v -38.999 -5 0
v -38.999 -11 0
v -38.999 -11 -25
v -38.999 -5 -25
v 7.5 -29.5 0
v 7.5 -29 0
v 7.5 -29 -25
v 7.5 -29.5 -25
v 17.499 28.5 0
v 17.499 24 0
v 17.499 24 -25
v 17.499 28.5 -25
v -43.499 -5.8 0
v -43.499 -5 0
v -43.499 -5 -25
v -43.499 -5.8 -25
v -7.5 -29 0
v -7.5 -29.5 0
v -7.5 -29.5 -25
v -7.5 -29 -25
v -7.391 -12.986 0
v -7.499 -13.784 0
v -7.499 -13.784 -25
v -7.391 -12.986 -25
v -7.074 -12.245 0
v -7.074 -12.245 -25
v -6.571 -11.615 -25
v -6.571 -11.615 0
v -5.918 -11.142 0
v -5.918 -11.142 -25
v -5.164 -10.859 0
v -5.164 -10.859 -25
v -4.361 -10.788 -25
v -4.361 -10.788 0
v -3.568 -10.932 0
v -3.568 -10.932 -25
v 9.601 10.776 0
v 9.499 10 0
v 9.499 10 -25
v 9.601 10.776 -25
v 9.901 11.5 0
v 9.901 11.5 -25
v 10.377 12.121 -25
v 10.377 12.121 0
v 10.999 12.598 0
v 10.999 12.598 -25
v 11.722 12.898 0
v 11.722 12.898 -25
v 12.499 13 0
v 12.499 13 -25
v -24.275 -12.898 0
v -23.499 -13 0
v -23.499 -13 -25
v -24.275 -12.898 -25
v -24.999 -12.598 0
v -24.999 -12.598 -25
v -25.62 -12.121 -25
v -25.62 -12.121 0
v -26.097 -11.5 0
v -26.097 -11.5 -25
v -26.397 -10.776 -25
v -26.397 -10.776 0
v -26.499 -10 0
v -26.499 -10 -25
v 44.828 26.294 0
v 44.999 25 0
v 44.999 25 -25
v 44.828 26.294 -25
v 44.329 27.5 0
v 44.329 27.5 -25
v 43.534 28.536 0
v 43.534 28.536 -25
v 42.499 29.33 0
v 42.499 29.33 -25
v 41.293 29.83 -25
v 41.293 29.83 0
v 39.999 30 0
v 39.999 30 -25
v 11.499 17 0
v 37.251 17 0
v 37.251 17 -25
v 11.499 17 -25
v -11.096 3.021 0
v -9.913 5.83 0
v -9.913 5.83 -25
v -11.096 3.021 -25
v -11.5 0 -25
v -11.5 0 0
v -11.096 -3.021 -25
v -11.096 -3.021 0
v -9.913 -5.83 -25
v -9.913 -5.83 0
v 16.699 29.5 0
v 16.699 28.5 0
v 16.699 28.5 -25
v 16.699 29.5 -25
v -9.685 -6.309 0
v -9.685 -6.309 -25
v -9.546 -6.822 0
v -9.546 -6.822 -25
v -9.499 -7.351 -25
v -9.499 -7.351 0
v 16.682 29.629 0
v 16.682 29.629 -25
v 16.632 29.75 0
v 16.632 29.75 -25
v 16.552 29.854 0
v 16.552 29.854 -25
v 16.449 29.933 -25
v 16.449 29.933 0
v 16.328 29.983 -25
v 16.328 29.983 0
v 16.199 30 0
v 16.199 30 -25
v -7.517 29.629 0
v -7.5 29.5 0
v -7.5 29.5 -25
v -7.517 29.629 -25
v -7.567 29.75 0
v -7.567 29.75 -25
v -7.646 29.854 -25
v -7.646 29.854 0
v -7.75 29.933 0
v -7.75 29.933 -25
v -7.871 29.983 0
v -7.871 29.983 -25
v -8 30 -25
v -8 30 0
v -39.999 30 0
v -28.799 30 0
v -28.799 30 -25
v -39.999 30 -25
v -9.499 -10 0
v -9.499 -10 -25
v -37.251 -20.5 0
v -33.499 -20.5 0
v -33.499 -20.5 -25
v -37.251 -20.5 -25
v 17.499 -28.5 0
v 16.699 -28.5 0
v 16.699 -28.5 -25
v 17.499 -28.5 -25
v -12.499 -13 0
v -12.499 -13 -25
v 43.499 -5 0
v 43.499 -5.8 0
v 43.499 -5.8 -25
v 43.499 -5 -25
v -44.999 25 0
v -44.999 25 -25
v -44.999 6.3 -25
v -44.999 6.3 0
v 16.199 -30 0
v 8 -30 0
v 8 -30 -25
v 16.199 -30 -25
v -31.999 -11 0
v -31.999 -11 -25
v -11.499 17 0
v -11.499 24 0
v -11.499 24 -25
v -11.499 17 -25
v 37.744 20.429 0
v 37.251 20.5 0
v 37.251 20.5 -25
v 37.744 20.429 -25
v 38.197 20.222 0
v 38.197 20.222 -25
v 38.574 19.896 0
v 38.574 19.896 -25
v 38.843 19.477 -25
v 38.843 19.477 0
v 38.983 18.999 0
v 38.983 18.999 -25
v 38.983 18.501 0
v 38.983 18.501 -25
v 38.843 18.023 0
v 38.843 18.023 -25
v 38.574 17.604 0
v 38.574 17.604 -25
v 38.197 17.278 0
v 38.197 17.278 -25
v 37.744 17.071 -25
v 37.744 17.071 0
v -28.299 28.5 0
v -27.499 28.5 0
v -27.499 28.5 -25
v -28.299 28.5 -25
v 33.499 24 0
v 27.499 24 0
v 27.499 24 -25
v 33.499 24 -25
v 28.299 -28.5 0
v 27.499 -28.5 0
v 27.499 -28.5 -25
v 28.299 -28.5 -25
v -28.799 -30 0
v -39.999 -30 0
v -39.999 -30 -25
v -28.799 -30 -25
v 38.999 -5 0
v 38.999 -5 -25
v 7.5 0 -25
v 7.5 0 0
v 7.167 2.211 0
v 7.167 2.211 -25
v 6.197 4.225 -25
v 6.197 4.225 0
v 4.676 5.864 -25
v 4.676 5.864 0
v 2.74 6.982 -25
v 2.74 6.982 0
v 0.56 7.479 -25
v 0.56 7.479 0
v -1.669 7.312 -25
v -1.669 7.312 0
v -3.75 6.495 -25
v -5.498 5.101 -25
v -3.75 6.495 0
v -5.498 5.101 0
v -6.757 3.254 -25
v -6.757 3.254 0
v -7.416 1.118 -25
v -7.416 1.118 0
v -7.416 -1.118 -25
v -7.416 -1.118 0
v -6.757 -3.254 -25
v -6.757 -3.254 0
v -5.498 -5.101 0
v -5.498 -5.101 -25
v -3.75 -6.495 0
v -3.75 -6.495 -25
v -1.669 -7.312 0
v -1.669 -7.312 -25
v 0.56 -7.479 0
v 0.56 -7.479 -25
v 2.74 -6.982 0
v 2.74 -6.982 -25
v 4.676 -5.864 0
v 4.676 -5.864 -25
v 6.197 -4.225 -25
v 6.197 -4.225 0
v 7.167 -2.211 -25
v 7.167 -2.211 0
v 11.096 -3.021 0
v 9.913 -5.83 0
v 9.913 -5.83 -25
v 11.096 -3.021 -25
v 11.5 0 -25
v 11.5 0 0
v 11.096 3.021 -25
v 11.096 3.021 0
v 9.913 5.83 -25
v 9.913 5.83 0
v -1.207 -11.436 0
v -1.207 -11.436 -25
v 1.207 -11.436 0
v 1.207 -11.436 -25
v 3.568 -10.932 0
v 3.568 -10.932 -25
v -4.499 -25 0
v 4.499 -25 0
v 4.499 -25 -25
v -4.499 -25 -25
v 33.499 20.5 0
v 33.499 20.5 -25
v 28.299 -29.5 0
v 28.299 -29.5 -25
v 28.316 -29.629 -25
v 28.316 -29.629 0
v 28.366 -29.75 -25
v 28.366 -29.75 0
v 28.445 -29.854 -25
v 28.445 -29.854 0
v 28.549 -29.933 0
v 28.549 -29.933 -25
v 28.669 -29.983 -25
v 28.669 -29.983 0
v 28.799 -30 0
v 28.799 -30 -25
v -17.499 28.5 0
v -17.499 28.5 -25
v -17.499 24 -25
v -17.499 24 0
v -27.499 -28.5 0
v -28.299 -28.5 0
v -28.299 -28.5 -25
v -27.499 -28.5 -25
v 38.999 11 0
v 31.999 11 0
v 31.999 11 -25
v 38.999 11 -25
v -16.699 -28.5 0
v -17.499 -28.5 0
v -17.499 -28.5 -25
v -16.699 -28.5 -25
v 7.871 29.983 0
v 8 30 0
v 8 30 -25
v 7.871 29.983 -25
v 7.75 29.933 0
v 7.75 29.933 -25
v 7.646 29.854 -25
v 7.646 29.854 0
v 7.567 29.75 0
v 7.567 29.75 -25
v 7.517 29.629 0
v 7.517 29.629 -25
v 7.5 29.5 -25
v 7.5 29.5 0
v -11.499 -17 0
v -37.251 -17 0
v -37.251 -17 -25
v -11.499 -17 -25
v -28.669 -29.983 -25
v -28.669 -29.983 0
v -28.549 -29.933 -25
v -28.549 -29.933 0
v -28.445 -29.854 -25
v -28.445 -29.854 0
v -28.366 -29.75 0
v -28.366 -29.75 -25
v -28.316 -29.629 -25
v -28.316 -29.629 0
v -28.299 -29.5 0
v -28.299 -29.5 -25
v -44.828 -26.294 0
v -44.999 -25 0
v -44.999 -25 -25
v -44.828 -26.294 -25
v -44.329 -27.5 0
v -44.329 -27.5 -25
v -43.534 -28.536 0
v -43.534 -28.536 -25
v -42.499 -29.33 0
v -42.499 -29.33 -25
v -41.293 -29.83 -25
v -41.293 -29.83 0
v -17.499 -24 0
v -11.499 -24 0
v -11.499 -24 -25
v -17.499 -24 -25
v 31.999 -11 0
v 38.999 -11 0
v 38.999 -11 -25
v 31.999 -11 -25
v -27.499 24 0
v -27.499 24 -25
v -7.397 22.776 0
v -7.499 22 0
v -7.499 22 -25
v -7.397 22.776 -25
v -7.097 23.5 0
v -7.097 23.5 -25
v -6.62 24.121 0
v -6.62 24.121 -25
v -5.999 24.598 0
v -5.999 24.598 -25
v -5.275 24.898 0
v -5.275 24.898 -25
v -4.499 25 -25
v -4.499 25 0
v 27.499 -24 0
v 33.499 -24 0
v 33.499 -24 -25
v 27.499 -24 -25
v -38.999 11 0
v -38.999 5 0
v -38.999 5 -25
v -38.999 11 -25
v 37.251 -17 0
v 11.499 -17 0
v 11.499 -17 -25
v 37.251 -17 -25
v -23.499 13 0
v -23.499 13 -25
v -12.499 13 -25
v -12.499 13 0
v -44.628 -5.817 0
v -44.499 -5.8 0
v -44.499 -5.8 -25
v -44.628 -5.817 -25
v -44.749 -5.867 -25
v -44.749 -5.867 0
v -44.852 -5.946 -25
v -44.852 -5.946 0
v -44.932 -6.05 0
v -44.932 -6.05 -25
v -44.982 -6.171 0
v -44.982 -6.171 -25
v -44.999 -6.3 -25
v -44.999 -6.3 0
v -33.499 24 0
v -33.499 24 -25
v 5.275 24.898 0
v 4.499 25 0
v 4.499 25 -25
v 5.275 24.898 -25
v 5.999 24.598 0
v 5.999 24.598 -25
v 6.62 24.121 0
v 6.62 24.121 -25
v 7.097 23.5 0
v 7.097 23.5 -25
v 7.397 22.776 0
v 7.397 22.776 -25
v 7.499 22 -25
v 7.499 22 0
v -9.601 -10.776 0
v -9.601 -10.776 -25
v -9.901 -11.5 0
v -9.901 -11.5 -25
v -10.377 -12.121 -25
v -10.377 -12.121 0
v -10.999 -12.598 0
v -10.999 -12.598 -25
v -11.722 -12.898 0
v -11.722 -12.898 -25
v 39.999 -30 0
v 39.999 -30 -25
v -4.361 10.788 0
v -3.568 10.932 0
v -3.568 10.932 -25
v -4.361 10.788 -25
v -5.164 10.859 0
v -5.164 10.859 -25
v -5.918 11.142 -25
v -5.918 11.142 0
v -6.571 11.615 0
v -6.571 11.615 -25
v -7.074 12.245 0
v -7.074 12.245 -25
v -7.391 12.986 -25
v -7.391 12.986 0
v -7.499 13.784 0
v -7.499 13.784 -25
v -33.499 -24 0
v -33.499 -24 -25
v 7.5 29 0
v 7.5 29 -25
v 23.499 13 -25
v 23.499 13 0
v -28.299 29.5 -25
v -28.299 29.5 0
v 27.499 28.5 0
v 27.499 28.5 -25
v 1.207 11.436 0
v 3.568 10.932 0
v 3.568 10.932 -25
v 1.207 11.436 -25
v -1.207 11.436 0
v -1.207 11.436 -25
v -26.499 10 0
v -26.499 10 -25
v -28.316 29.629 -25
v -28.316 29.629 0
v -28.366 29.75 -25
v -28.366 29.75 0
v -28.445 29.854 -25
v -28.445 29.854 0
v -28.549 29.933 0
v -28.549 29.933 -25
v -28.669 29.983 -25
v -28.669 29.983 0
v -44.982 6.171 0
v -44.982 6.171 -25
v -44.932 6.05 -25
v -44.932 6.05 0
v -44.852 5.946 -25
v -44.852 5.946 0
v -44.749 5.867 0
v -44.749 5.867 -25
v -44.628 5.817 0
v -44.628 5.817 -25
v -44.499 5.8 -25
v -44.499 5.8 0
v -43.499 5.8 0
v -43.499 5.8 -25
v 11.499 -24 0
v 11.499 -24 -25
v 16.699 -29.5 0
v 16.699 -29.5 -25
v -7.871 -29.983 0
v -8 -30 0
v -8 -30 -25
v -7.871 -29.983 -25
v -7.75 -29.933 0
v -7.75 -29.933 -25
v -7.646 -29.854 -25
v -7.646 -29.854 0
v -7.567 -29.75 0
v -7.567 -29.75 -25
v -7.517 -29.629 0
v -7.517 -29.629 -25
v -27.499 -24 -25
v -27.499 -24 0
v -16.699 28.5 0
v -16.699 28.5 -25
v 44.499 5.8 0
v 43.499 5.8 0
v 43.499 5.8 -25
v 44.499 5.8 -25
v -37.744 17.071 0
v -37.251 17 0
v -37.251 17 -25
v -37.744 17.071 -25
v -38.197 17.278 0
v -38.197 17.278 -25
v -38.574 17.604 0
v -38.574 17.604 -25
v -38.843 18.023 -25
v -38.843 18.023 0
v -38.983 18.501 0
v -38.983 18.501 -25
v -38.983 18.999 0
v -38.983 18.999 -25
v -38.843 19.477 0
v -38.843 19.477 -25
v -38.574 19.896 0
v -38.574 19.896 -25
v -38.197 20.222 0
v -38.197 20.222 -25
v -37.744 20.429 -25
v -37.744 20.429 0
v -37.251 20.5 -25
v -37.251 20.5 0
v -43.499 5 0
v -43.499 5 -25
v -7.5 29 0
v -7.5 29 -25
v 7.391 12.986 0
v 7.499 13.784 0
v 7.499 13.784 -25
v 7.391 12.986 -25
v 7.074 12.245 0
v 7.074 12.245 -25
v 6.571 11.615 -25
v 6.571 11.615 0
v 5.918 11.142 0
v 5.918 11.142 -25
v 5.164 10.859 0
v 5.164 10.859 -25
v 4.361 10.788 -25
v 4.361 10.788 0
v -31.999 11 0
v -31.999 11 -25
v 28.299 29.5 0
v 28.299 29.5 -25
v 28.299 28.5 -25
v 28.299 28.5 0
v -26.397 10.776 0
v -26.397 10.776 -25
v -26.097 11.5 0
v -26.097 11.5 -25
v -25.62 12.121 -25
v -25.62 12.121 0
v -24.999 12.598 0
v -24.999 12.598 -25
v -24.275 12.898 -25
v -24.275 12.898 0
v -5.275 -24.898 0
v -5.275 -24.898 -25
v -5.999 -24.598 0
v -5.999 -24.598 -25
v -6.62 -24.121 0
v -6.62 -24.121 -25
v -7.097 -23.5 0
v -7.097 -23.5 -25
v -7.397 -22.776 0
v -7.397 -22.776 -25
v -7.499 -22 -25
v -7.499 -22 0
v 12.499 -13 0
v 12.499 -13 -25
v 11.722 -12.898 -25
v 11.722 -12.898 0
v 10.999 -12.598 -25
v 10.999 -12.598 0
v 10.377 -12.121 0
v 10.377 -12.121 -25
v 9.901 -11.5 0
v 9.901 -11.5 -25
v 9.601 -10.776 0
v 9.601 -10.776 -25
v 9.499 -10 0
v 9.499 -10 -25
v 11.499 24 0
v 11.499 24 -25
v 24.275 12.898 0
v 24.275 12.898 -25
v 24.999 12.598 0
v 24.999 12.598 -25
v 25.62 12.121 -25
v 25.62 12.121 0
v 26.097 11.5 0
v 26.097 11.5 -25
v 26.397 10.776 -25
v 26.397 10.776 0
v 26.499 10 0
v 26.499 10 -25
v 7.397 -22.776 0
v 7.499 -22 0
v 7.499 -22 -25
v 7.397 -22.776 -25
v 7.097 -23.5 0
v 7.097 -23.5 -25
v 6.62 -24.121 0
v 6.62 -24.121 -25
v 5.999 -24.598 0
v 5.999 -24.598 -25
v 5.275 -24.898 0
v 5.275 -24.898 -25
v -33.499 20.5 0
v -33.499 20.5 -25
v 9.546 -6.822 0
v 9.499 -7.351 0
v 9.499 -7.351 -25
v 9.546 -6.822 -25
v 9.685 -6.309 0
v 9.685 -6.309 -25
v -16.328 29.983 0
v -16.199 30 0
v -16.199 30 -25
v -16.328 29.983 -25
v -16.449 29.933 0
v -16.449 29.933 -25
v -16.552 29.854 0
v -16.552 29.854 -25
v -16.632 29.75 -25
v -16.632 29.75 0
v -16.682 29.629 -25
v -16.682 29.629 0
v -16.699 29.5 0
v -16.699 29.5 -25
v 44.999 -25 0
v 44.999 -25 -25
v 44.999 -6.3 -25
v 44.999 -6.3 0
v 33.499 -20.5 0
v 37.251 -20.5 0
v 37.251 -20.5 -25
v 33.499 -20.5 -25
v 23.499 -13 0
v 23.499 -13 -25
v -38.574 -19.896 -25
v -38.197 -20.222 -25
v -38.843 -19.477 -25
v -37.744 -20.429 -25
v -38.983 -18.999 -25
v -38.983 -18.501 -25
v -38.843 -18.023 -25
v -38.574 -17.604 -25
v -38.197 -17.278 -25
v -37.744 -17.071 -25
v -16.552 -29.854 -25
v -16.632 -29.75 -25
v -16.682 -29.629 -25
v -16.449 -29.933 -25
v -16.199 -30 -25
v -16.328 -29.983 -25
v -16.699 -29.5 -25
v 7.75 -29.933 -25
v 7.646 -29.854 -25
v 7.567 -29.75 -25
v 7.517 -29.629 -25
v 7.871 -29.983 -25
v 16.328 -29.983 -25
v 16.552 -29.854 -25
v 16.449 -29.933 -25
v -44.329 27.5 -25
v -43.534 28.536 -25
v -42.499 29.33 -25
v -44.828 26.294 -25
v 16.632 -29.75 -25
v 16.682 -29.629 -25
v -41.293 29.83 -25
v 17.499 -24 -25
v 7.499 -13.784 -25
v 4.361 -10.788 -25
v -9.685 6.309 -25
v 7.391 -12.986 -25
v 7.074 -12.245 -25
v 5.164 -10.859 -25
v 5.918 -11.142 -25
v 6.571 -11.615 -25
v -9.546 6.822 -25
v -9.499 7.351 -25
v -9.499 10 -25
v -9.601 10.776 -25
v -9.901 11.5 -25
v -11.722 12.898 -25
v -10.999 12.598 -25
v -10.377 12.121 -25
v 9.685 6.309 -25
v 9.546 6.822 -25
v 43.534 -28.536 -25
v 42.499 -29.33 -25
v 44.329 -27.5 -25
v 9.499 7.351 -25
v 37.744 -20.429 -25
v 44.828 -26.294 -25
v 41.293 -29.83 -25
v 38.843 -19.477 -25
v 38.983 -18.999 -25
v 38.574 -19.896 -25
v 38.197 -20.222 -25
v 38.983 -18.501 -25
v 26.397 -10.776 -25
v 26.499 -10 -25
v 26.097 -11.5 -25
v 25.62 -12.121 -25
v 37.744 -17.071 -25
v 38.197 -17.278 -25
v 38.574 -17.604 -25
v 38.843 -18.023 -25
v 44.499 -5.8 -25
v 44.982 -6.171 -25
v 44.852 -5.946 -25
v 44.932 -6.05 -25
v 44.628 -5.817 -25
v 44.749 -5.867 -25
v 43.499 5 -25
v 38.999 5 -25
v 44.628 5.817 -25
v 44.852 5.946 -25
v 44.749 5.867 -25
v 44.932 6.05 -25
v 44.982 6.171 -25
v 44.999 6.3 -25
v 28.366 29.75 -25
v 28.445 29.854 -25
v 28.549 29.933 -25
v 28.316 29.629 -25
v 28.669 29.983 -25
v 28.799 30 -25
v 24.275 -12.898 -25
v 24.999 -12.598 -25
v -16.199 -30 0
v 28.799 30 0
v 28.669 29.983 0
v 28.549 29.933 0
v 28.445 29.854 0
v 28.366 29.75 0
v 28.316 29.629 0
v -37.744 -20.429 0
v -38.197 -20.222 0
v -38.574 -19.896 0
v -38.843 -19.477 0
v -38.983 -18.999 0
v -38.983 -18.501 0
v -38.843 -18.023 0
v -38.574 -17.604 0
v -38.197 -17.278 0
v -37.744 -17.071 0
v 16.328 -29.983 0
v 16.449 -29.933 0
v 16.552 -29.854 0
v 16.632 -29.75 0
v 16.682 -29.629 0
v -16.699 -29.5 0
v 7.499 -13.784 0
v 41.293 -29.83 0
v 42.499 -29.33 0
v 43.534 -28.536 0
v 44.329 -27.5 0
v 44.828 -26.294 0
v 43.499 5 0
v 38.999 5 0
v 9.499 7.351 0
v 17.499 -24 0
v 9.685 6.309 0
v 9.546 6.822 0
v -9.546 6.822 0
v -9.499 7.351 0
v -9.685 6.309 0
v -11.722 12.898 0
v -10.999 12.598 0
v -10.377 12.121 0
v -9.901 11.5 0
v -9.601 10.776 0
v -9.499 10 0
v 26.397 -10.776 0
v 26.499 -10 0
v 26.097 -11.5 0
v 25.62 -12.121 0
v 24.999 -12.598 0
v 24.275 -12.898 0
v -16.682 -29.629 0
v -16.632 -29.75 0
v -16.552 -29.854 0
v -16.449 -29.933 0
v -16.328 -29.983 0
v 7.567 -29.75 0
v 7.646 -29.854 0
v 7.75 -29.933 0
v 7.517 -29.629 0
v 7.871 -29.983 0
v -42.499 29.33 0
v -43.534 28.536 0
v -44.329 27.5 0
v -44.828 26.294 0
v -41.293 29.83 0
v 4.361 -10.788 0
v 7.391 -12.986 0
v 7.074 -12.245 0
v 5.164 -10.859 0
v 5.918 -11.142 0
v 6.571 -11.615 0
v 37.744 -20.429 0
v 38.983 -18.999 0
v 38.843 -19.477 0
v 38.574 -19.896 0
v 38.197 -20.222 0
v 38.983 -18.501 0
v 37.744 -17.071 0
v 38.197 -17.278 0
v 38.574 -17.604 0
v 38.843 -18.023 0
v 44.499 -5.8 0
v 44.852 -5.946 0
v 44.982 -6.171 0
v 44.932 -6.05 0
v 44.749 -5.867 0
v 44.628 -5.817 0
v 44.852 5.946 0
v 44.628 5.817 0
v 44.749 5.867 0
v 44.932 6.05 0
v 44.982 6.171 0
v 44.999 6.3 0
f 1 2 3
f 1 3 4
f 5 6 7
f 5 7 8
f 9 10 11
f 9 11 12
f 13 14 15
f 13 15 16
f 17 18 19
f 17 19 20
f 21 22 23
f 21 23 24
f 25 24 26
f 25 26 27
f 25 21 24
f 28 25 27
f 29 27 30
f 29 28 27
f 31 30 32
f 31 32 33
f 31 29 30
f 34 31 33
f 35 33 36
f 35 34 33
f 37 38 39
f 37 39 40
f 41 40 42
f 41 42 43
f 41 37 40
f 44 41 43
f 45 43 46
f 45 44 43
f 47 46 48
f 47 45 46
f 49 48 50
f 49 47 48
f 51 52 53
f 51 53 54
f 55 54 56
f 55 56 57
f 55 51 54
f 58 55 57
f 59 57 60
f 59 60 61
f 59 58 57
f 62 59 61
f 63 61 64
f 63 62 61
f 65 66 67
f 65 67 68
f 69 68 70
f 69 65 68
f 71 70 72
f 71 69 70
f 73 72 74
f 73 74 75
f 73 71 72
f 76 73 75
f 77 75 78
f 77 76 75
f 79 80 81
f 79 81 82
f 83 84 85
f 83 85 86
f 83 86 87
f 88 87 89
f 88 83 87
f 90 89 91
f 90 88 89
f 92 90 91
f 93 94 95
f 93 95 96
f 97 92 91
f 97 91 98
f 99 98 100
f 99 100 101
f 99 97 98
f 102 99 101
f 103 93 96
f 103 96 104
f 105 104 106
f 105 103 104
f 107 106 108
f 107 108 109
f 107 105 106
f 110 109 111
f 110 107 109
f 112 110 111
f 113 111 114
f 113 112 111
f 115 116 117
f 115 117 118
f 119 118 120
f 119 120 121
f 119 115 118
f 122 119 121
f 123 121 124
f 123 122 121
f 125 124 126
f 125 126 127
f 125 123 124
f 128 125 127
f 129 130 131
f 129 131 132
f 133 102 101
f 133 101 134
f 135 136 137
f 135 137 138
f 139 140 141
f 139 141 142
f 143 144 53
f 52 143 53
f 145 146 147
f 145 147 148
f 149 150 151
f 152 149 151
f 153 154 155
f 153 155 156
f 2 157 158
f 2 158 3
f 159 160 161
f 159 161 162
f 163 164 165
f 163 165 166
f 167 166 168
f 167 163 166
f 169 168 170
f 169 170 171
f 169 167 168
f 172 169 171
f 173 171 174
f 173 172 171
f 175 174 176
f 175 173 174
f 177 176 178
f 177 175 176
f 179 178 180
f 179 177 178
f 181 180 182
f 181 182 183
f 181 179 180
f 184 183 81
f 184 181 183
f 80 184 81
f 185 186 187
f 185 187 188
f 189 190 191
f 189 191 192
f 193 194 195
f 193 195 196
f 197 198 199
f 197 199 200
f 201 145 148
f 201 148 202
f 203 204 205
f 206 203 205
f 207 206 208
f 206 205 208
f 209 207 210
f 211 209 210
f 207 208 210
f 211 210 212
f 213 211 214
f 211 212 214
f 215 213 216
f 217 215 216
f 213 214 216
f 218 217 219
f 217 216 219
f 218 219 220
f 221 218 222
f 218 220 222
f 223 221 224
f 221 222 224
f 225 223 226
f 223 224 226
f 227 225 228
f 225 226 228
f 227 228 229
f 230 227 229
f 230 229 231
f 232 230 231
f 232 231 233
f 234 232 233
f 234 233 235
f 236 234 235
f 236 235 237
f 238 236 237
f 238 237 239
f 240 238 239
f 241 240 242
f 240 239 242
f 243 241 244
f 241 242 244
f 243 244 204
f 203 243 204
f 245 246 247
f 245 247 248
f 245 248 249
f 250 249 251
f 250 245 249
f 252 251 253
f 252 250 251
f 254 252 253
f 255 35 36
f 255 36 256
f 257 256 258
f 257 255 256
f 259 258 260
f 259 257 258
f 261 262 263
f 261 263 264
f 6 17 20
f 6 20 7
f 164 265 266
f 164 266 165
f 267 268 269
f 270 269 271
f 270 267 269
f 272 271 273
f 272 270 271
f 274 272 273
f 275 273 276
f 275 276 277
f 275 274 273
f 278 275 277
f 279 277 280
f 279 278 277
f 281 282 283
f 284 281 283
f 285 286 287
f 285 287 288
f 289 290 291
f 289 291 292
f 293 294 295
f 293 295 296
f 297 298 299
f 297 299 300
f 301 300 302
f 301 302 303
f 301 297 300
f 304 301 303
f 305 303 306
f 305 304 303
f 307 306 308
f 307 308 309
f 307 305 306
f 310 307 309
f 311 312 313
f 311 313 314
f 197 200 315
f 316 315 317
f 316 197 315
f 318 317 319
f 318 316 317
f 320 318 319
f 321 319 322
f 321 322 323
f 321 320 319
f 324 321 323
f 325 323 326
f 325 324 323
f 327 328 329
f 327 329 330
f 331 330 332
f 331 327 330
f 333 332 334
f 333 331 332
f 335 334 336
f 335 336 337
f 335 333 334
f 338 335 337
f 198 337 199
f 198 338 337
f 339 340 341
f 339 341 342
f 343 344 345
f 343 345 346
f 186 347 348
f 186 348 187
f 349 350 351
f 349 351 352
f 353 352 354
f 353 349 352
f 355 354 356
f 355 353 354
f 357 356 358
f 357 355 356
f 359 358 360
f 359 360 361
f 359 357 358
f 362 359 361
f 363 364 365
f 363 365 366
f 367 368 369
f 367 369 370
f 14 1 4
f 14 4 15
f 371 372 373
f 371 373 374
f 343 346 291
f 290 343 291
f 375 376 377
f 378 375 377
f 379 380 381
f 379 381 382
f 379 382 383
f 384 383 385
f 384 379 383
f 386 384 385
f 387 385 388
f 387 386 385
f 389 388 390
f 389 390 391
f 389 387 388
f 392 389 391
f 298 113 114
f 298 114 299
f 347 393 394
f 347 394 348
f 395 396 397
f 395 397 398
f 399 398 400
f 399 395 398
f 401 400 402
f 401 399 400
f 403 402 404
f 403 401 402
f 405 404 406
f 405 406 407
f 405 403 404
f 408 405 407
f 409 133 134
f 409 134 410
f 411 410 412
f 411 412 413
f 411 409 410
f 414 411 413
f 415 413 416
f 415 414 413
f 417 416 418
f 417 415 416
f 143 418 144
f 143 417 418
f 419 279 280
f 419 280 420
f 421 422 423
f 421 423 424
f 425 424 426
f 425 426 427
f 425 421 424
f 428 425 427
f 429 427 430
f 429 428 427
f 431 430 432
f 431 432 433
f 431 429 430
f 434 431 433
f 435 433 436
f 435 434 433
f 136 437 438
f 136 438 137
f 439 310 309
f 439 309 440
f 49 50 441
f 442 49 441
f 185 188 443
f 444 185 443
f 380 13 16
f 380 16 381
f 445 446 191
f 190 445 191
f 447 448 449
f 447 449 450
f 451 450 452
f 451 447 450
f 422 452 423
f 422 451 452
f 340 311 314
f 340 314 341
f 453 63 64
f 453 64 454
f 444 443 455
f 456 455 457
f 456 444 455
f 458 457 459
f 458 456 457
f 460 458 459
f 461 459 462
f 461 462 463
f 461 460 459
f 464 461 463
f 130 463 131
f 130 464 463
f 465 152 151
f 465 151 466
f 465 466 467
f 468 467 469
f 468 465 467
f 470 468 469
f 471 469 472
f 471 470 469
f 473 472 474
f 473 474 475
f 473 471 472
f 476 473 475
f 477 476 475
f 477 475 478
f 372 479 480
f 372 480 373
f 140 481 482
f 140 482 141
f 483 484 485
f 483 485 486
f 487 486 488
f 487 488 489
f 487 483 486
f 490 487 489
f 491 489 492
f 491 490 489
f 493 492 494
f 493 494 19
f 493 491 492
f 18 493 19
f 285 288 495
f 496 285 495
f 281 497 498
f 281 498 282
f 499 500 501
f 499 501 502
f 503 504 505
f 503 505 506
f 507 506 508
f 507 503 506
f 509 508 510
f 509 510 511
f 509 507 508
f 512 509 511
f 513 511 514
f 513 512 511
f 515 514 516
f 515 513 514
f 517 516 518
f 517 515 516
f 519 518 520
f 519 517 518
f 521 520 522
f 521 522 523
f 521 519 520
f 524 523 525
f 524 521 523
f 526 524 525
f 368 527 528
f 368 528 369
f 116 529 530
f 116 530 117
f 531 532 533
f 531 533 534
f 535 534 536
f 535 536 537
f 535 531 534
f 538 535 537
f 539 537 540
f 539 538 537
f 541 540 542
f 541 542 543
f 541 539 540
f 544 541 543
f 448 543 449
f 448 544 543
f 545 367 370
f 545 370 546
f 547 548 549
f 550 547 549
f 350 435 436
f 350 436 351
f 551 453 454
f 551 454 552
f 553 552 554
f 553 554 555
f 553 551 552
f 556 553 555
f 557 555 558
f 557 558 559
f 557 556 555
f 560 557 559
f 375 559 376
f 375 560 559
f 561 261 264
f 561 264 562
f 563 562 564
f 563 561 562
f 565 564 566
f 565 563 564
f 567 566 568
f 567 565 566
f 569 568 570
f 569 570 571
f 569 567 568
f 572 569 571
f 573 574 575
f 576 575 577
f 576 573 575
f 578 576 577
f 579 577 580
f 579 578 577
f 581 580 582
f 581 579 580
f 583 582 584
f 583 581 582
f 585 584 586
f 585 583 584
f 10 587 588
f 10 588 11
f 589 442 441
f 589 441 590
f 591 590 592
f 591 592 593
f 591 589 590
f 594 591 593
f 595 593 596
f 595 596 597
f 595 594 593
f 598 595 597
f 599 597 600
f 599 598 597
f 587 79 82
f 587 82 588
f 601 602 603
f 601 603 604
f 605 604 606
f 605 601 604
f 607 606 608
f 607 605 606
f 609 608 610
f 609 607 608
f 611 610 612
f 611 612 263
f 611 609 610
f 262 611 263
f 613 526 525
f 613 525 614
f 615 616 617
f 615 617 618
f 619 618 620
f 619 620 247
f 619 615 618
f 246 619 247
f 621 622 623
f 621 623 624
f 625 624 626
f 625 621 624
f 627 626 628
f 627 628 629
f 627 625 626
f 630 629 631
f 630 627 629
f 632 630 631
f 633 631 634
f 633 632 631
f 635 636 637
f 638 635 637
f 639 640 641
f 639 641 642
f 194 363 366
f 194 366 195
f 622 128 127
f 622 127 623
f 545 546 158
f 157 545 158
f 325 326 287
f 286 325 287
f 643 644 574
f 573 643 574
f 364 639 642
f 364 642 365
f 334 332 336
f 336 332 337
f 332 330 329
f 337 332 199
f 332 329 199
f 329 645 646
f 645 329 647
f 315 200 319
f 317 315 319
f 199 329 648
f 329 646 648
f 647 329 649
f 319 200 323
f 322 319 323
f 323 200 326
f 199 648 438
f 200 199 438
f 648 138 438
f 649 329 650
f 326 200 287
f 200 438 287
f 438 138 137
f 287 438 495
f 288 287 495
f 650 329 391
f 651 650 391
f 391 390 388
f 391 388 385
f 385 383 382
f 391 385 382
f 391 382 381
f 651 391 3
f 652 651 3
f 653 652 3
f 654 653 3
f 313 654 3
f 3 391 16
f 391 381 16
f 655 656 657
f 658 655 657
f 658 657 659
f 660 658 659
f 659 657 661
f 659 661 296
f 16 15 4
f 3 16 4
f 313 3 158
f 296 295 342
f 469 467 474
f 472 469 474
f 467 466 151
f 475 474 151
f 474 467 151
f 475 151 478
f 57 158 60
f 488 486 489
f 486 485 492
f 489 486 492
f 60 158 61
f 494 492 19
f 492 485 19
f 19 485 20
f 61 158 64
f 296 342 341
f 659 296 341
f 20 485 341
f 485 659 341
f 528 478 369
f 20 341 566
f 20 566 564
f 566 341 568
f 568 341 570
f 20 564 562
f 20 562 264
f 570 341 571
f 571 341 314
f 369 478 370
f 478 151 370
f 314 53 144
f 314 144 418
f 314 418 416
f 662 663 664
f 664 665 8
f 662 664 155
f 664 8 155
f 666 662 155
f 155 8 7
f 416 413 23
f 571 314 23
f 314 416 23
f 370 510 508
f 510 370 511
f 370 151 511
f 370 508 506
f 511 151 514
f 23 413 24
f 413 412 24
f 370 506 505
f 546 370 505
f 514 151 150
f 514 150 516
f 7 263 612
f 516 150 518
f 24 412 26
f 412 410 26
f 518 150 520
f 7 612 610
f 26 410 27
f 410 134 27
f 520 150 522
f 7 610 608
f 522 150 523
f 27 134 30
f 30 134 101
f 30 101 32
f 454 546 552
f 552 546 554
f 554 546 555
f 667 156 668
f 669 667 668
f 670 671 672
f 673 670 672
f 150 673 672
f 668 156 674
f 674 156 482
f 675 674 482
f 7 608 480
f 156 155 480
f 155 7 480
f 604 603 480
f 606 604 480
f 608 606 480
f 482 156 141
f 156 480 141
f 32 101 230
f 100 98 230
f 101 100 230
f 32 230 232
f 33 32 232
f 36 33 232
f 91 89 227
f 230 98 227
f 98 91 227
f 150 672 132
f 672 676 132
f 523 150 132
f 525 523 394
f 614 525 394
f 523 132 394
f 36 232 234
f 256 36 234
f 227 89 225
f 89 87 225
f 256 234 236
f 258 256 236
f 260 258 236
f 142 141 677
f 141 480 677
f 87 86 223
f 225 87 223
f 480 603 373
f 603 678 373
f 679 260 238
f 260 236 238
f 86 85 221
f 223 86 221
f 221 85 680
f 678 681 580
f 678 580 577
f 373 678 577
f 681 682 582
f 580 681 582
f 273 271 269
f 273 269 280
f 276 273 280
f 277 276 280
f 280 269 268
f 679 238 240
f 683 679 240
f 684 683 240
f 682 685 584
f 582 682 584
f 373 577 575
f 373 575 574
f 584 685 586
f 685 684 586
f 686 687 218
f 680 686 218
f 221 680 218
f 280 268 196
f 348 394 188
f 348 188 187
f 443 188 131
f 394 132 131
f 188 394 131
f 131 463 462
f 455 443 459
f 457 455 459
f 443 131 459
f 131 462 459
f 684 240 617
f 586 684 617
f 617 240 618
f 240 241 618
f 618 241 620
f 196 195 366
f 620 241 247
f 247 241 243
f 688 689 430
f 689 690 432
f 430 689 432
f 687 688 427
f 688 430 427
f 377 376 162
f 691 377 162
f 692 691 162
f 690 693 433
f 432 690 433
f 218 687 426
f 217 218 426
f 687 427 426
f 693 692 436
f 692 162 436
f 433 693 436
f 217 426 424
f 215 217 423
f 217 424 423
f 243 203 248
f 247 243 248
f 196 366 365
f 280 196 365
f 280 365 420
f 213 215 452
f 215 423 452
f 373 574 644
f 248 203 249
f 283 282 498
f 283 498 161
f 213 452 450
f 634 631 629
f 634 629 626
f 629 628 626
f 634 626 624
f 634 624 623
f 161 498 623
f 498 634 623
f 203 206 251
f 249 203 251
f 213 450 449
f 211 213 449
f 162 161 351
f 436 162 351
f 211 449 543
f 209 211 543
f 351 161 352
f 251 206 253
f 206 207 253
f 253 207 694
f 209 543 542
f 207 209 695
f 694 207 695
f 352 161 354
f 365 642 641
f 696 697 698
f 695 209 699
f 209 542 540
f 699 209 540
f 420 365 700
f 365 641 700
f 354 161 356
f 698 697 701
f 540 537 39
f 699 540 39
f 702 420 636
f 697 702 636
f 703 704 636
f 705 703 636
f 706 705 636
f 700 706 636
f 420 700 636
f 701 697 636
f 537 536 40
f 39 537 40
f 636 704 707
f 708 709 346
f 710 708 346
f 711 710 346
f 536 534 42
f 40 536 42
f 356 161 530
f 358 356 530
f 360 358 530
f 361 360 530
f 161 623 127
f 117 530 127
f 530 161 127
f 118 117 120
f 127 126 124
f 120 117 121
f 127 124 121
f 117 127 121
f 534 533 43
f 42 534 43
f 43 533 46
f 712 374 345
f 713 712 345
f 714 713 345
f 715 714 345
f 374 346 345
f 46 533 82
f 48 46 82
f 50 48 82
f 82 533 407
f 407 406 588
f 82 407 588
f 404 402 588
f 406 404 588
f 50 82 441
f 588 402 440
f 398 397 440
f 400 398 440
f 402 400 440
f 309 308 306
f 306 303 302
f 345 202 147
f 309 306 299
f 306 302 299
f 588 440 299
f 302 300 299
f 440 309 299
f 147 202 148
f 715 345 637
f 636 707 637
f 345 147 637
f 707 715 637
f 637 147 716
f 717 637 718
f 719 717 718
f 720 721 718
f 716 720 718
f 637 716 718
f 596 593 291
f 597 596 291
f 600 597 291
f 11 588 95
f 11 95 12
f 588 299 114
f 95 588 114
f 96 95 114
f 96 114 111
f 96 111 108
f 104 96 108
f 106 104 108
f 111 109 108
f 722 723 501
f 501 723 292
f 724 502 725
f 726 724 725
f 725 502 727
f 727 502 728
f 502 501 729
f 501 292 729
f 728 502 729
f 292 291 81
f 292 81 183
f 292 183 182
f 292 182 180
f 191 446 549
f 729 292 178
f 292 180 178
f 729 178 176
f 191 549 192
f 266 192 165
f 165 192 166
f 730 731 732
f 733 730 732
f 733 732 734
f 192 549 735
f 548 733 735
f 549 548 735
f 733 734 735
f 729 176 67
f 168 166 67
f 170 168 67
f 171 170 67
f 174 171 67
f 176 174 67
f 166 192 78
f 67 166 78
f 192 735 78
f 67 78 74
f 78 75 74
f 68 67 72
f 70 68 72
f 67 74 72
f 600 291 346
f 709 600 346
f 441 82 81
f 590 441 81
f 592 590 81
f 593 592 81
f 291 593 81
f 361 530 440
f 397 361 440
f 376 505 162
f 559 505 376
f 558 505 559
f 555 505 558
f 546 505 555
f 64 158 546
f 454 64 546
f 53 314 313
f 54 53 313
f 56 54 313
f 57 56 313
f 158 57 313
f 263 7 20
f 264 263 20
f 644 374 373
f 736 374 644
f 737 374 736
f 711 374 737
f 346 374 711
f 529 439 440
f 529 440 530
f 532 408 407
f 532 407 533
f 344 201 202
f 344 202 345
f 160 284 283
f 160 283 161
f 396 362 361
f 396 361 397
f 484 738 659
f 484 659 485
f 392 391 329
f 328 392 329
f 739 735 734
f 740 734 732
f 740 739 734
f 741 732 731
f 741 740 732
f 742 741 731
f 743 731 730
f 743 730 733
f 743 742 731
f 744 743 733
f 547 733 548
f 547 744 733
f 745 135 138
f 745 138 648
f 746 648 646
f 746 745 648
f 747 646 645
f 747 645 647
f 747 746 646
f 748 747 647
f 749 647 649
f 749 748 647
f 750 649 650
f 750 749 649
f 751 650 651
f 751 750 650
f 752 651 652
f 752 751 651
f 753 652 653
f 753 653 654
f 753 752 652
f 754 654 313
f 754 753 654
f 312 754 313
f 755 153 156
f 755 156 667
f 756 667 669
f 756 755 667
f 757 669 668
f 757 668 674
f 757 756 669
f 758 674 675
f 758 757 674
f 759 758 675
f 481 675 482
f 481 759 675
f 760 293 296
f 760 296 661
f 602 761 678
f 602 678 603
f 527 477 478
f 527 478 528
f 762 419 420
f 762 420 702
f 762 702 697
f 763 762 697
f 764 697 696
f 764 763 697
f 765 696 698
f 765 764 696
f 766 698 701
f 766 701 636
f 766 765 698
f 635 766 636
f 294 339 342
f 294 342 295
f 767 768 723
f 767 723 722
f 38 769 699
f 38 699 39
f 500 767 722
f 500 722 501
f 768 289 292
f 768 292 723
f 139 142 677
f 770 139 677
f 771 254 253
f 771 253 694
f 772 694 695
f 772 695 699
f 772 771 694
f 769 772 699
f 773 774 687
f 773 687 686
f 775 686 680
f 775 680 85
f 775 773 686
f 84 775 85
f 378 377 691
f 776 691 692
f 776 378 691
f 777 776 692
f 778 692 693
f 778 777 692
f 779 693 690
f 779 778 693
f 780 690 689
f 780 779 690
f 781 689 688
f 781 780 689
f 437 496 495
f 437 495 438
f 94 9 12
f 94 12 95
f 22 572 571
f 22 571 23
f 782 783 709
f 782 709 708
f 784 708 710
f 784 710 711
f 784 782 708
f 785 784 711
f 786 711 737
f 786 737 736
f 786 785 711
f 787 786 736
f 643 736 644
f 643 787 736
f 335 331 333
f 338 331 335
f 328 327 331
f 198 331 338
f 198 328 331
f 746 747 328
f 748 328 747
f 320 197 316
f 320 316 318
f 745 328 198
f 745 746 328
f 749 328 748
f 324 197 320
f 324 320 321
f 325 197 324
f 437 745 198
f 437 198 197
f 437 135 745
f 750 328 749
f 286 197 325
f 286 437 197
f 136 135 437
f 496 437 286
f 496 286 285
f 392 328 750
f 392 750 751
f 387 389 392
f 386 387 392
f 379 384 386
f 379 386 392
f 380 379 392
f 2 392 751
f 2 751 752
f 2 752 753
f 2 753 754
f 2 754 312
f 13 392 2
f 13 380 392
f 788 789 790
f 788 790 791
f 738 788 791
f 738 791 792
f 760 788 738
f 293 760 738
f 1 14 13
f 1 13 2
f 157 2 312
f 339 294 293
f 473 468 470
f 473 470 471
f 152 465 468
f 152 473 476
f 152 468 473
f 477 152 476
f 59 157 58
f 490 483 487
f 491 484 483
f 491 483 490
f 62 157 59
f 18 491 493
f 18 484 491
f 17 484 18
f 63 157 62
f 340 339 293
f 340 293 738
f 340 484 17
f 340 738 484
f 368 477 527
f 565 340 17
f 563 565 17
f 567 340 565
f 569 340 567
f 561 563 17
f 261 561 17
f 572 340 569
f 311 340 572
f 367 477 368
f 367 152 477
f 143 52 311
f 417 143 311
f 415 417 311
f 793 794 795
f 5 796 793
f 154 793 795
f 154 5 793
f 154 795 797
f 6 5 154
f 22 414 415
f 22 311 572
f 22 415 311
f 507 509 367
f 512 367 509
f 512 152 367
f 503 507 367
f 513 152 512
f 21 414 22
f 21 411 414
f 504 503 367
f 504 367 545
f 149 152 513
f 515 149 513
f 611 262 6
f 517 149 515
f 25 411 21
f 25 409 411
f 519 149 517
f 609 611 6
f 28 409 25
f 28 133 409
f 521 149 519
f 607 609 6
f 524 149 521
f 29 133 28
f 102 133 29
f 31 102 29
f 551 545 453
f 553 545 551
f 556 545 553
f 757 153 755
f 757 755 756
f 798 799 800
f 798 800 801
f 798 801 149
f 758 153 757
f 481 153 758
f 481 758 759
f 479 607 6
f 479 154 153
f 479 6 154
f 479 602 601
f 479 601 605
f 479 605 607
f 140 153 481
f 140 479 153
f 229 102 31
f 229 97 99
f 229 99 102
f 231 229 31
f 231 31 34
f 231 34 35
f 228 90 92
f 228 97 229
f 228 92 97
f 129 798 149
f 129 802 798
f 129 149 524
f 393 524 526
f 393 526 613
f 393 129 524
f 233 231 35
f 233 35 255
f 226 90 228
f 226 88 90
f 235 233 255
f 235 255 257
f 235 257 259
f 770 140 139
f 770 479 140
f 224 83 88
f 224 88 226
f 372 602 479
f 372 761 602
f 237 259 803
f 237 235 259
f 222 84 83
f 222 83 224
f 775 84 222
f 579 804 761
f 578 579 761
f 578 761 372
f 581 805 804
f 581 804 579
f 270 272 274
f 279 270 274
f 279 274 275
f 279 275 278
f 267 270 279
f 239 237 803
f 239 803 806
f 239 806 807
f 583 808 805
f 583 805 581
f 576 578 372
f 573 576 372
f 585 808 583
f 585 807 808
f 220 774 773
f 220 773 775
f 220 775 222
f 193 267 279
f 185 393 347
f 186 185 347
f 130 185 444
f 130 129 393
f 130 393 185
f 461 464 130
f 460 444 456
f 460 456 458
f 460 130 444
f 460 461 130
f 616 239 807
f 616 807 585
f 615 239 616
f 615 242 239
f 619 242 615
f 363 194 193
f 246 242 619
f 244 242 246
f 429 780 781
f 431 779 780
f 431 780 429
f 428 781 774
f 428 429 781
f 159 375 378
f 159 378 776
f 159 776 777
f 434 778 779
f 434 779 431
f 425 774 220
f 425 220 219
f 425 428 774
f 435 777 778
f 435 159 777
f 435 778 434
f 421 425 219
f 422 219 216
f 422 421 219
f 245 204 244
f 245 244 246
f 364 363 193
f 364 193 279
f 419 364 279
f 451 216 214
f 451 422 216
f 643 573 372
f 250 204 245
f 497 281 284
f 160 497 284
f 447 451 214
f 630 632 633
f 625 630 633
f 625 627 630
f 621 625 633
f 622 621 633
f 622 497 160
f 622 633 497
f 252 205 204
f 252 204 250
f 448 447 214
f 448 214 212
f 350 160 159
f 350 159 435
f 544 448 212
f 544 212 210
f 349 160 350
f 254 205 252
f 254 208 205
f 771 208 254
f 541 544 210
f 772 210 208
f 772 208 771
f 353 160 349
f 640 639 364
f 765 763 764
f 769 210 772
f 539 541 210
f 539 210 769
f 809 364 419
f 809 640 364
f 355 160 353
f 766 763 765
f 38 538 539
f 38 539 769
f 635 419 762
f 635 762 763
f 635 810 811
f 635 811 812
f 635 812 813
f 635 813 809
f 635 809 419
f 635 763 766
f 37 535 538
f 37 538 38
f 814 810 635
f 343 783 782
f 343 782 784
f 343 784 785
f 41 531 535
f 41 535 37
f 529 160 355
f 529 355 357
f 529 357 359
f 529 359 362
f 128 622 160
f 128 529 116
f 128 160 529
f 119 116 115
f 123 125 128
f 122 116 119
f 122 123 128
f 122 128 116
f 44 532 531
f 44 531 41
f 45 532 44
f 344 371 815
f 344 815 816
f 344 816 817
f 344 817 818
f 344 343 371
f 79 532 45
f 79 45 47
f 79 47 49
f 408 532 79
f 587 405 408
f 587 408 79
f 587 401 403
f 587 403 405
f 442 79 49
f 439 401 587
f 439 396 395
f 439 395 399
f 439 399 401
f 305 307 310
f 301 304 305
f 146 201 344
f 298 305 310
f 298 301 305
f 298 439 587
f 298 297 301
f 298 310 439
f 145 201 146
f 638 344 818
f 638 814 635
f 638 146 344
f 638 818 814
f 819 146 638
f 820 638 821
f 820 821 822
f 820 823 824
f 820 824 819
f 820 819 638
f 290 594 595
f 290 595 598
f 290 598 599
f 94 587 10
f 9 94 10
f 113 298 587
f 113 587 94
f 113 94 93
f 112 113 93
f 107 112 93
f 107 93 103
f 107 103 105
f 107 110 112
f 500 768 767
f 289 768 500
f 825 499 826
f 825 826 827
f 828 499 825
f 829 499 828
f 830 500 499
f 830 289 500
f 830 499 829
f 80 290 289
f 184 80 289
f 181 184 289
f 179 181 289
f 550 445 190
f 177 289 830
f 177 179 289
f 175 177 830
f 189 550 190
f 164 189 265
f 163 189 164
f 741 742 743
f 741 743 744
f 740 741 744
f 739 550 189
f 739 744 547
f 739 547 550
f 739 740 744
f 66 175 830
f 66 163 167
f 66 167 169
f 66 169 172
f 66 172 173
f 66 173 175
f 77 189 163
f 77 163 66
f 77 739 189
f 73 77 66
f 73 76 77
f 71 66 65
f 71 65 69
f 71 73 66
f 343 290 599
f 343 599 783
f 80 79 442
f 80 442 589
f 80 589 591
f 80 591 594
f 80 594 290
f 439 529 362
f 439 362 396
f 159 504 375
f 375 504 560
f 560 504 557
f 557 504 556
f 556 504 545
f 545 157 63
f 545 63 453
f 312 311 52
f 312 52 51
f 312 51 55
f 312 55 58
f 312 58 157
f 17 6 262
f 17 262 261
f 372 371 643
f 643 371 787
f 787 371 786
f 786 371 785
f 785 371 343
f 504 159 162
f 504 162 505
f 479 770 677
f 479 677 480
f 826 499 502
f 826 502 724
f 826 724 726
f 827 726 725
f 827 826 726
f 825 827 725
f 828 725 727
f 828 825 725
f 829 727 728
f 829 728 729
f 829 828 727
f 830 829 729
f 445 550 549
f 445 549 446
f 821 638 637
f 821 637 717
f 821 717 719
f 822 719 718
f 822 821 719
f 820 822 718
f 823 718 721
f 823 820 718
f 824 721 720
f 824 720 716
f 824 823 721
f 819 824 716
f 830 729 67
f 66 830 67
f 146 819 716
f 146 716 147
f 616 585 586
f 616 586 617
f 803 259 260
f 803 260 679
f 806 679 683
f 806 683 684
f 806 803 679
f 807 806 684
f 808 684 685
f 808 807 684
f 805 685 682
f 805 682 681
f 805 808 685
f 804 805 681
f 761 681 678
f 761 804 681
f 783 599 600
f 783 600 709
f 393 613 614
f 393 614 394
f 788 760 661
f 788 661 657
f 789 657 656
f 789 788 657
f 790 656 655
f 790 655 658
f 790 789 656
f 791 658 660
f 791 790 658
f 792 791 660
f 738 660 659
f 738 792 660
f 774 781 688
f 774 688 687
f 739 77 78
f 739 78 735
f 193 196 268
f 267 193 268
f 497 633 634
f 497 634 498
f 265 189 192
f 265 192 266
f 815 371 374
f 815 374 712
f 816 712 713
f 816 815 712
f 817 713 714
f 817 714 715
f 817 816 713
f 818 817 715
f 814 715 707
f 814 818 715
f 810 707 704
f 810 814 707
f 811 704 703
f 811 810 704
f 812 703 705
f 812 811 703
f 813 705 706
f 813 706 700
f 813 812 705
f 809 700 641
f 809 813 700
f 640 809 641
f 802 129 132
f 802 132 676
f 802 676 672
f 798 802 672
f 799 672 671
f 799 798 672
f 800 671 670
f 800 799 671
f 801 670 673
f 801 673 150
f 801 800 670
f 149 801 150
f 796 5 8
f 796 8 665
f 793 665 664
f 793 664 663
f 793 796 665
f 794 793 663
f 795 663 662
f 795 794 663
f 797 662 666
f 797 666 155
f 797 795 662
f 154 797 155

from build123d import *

# Parameters (mm, degrees)
SKETCH1_R           = 7.4999849
BOSS_EXTRUDE1_DEPTH = 25


with BuildPart() as part:
    # Sketch1 → Boss-Extrude1 (new body)
    with BuildSketch(Plane.XY):
        with BuildLine():
            Line((28.798743476, -29.99996723), (39.998722185, -29.99996723))
            ThreePointArc((39.998722185, -29.99996723), (43.534246379, -28.535505159), (44.99870845, -24.999980965))
            Line((44.99870845, -24.999980965), (44.99870845, -6.300013256))
            ThreePointArc((44.99870845, -6.300013256), (44.852262243, -5.946460836), (44.498709824, -5.800014629))
            Line((44.498709824, -5.800014629), (43.49871145, -5.800014629))
            Line((43.49871145, -5.800014629), (43.49871145, -5.00001723))
            Line((43.49871145, -5.00001723), (38.99872045, -5.00001723))
            Line((38.99872045, -5.00001723), (38.99872045, -11.00000523))
            Line((38.99872045, -11.00000523), (31.99873445, -11.00000523))
            Line((31.99873445, -11.00000523), (31.99873445, 11.00000523))
            Line((31.99873445, 11.00000523), (38.99872045, 11.00000523))
            Line((38.99872045, 11.00000523), (38.99872045, 5.00001723))
            Line((38.99872045, 5.00001723), (43.49871145, 5.00001723))
            Line((43.49871145, 5.00001723), (43.49871145, 5.800014629))
            Line((43.49871145, 5.800014629), (44.498709824, 5.800014629))
            ThreePointArc((44.498709824, 5.800014629), (44.852262243, 5.946460836), (44.99870845, 6.300013256))
            Line((44.99870845, 6.300013256), (44.99870845, 24.999980965))
            ThreePointArc((44.99870845, 24.999980965), (43.534246379, 28.535505159), (39.998722185, 29.99996723))
            Line((39.998722185, 29.99996723), (28.798743476, 29.99996723))
            ThreePointArc((28.798743476, 29.99996723), (28.445191057, 29.853521023), (28.29874485, 29.499968604))
            Line((28.29874485, 29.499968604), (28.29874485, 28.499970229))
            Line((28.29874485, 28.499970229), (27.49874345, 28.499970229))
            Line((27.49874345, 28.499970229), (27.49874345, 23.999979229))
            Line((27.49874345, 23.999979229), (33.49873145, 23.999979229))
            Line((33.49873145, 23.999979229), (33.49873145, 20.499986229))
            Line((33.49873145, 20.499986229), (37.251126945, 20.499986229))
            ThreePointArc((37.251126945, 20.499986229), (39.001123445, 18.749989729), (37.251126945, 16.999993229))
            Line((37.251126945, 16.999993229), (11.49877545, 16.999993229))
            Line((11.49877545, 16.999993229), (11.49877545, 23.999979229))
            Line((11.49877545, 23.999979229), (17.49876345, 23.999979229))
            Line((17.49876345, 23.999979229), (17.49876345, 28.499970229))
            Line((17.49876345, 28.499970229), (16.69876605, 28.499970229))
            Line((16.69876605, 28.499970229), (16.69876605, 29.49996775))
            ThreePointArc((16.69876605, 29.49996775), (16.552319593, 29.853520773), (16.19876657, 29.99996723))
            Line((16.19876657, 29.99996723), (7.999983464, 29.99996723))
            ThreePointArc((7.999983464, 29.99996723), (7.646431045, 29.853521023), (7.499984838, 29.499968604))
            Line((7.499984838, 29.499968604), (7.499984838, 28.99995862))
            Line((7.499984838, 28.99995862), (-7.499984838, 28.99995862))
            Line((-7.499984838, 28.99995862), (-7.499984838, 29.499968604))
            ThreePointArc((-7.499984838, 29.499968604), (-7.646431045, 29.853521023), (-7.999983464, 29.99996723))
            Line((-7.999983464, 29.99996723), (-16.19876657, 29.99996723))
            ThreePointArc((-16.19876657, 29.99996723), (-16.552319593, 29.853520773), (-16.69876605, 29.49996775))
            Line((-16.69876605, 29.49996775), (-16.69876605, 28.499970229))
            Line((-16.69876605, 28.499970229), (-17.49876345, 28.499970229))
            Line((-17.49876345, 28.499970229), (-17.49876345, 23.999979229))
            Line((-17.49876345, 23.999979229), (-11.49877545, 23.999979229))
            Line((-11.49877545, 23.999979229), (-11.49877545, 16.999993229))
            Line((-11.49877545, 16.999993229), (-37.251126945, 16.999993229))
            ThreePointArc((-37.251126945, 16.999993229), (-39.001123445, 18.749989729), (-37.251126945, 20.499986229))
            Line((-37.251126945, 20.499986229), (-33.49873145, 20.499986229))
            Line((-33.49873145, 20.499986229), (-33.49873145, 23.999979229))
            Line((-33.49873145, 23.999979229), (-27.49874345, 23.999979229))
            Line((-27.49874345, 23.999979229), (-27.49874345, 28.499970229))
            Line((-27.49874345, 28.499970229), (-28.29874485, 28.499970229))
            Line((-28.29874485, 28.499970229), (-28.29874485, 29.499968604))
            ThreePointArc((-28.29874485, 29.499968604), (-28.445191057, 29.853521023), (-28.798743476, 29.99996723))
            Line((-28.798743476, 29.99996723), (-39.998722185, 29.99996723))
            ThreePointArc((-39.998722185, 29.99996723), (-43.534246379, 28.535505159), (-44.99870845, 24.999980965))
            Line((-44.99870845, 24.999980965), (-44.99870845, 6.300013256))
            ThreePointArc((-44.99870845, 6.300013256), (-44.852262243, 5.946460836), (-44.498709824, 5.800014629))
            Line((-44.498709824, 5.800014629), (-43.49871145, 5.800014629))
            Line((-43.49871145, 5.800014629), (-43.49871145, 5.00001723))
            Line((-43.49871145, 5.00001723), (-38.99872045, 5.00001723))
            Line((-38.99872045, 5.00001723), (-38.99872045, 11.00000523))
            Line((-38.99872045, 11.00000523), (-31.99873445, 11.00000523))
            Line((-31.99873445, 11.00000523), (-31.99873445, -11.00000523))
            Line((-31.99873445, -11.00000523), (-38.99872045, -11.00000523))
            Line((-38.99872045, -11.00000523), (-38.99872045, -5.00001723))
            Line((-38.99872045, -5.00001723), (-43.49871145, -5.00001723))
            Line((-43.49871145, -5.00001723), (-43.49871145, -5.800014629))
            Line((-43.49871145, -5.800014629), (-44.498709824, -5.800014629))
            ThreePointArc((-44.498709824, -5.800014629), (-44.852262243, -5.946460836), (-44.99870845, -6.300013256))
            Line((-44.99870845, -6.300013256), (-44.99870845, -24.999980965))
            ThreePointArc((-44.99870845, -24.999980965), (-43.534246379, -28.535505159), (-39.998722185, -29.99996723))
            Line((-39.998722185, -29.99996723), (-28.798743476, -29.99996723))
            ThreePointArc((-28.798743476, -29.99996723), (-28.445191057, -29.853521023), (-28.29874485, -29.499968604))
            Line((-28.29874485, -29.499968604), (-28.29874485, -28.499970229))
            Line((-28.29874485, -28.499970229), (-27.49874345, -28.499970229))
            Line((-27.49874345, -28.499970229), (-27.49874345, -23.999979229))
            Line((-27.49874345, -23.999979229), (-33.49873145, -23.999979229))
            Line((-33.49873145, -23.999979229), (-33.49873145, -20.499986229))
            Line((-33.49873145, -20.499986229), (-37.251126945, -20.499986229))
            ThreePointArc((-37.251126945, -20.499986229), (-39.001123445, -18.749989729), (-37.251126945, -16.999993229))
            Line((-37.251126945, -16.999993229), (-11.49877545, -16.999993229))
            Line((-11.49877545, -16.999993229), (-11.49877545, -23.999979229))
            Line((-11.49877545, -23.999979229), (-17.49876345, -23.999979229))
            Line((-17.49876345, -23.999979229), (-17.49876345, -28.499970229))
            Line((-17.49876345, -28.499970229), (-16.69876605, -28.499970229))
            Line((-16.69876605, -28.499970229), (-16.69876605, -29.49996775))
            ThreePointArc((-16.69876605, -29.49996775), (-16.552319593, -29.853520773), (-16.19876657, -29.99996723))
            Line((-16.19876657, -29.99996723), (-7.999983464, -29.99996723))
            ThreePointArc((-7.999983464, -29.99996723), (-7.646431045, -29.853521023), (-7.499984838, -29.499968604))
            Line((-7.499984838, -29.499968604), (-7.499984838, -28.99995862))
            Line((-7.499984838, -28.99995862), (7.499984838, -28.99995862))
            Line((7.499984838, -28.99995862), (7.499984838, -29.499968604))
            ThreePointArc((7.499984838, -29.499968604), (7.646431045, -29.853521023), (7.999983464, -29.99996723))
            Line((7.999983464, -29.99996723), (16.19876657, -29.99996723))
            ThreePointArc((16.19876657, -29.99996723), (16.552319593, -29.853520773), (16.69876605, -29.49996775))
            Line((16.69876605, -29.49996775), (16.69876605, -28.499970229))
            Line((16.69876605, -28.499970229), (17.49876345, -28.499970229))
            Line((17.49876345, -28.499970229), (17.49876345, -23.999979229))
            Line((17.49876345, -23.999979229), (11.49877545, -23.999979229))
            Line((11.49877545, -23.999979229), (11.49877545, -16.999993229))
            Line((11.49877545, -16.999993229), (37.251126945, -16.999993229))
            ThreePointArc((37.251126945, -16.999993229), (39.001123445, -18.749989729), (37.251126945, -20.499986229))
            Line((37.251126945, -20.499986229), (33.49873145, -20.499986229))
            Line((33.49873145, -20.499986229), (33.49873145, -23.999979229))
            Line((33.49873145, -23.999979229), (27.49874345, -23.999979229))
            Line((27.49874345, -23.999979229), (27.49874345, -28.499970229))
            Line((27.49874345, -28.499970229), (28.29874485, -28.499970229))
            Line((28.29874485, -28.499970229), (28.29874485, -29.499968604))
            ThreePointArc((28.29874485, -29.499968604), (28.445191057, -29.853521023), (28.798743476, -29.99996723))
        make_face()
        Circle(SKETCH1_R, mode=Mode.SUBTRACT)
        with BuildLine():
            Line((7.498782838, -13.784434919), (7.498782838, -21.999974861))
            ThreePointArc((7.498782838, -21.999974861), (6.620105596, -24.121289377), (4.498791079, -24.99996662))
            Line((4.498791079, -24.99996662), (-4.498791079, -24.99996662))
            ThreePointArc((-4.498791079, -24.99996662), (-6.620105596, -24.121289377), (-7.498782838, -21.999974861))
            Line((-7.498782838, -21.999974861), (-7.498782838, -13.784434919))
            ThreePointArc((-7.498782838, -13.784434919), (-6.26055251, -11.356235576), (-3.568006565, -10.932487146))
            ThreePointArc((-3.568006565, -10.932487146), (0, -11.499997654), (3.568006565, -10.932487146))
            ThreePointArc((3.568006565, -10.932487146), (6.26055251, -11.356235576), (7.498782838, -13.784434919))
        make_face(mode=Mode.SUBTRACT)
        with BuildLine():
            Line((-7.498782838, 13.784434919), (-7.498782838, 21.999974861))
            ThreePointArc((-7.498782838, 21.999974861), (-6.620105596, 24.121289377), (-4.498791079, 24.99996662))
            Line((-4.498791079, 24.99996662), (4.498791079, 24.99996662))
            ThreePointArc((4.498791079, 24.99996662), (6.620105596, 24.121289377), (7.498782838, 21.999974861))
            Line((7.498782838, 21.999974861), (7.498782838, 13.784434919))
            ThreePointArc((7.498782838, 13.784434919), (6.26055251, 11.356235576), (3.568006565, 10.932487146))
            ThreePointArc((3.568006565, 10.932487146), (0, 11.499997654), (-3.568006565, 10.932487146))
            ThreePointArc((-3.568006565, 10.932487146), (-6.26055251, 11.356235576), (-7.498782838, 13.784434919))
        make_face(mode=Mode.SUBTRACT)
        with BuildLine():
            Line((26.498750816, 9.999999861), (26.498750816, -9.999999861))
            ThreePointArc((26.498750816, -9.999999861), (25.620073573, -12.121314377), (23.498759057, -12.99999162))
            Line((23.498759057, -12.99999162), (12.498776575, -12.99999162))
            ThreePointArc((12.498776575, -12.99999162), (10.377462058, -12.121314377), (9.498784816, -9.999999861))
            Line((9.498784816, -9.999999861), (9.498784816, -7.350508853))
            ThreePointArc((9.498784816, -7.350508853), (9.604145594, -6.562432144), (9.912827344, -5.829710252))
            ThreePointArc((9.912827344, -5.829710252), (11.499985547, 0), (9.912827344, 5.829710252))
            ThreePointArc((9.912827344, 5.829710252), (9.604145594, 6.562432144), (9.498784816, 7.350508853))
            Line((9.498784816, 7.350508853), (9.498784816, 9.999999861))
            ThreePointArc((9.498784816, 9.999999861), (10.377462058, 12.121314377), (12.498776575, 12.99999162))
            Line((12.498776575, 12.99999162), (23.498759057, 12.99999162))
            ThreePointArc((23.498759057, 12.99999162), (25.620073573, 12.121314377), (26.498750816, 9.999999861))
        make_face(mode=Mode.SUBTRACT)
        with BuildLine():
            Line((-9.498784816, -7.350508853), (-9.498784816, -9.999999861))
            ThreePointArc((-9.498784816, -9.999999861), (-10.377462058, -12.121314377), (-12.498776575, -12.99999162))
            Line((-12.498776575, -12.99999162), (-23.498759057, -12.99999162))
            ThreePointArc((-23.498759057, -12.99999162), (-25.620073573, -12.121314377), (-26.498750816, -9.999999861))
            Line((-26.498750816, -9.999999861), (-26.498750816, 9.999999861))
            ThreePointArc((-26.498750816, 9.999999861), (-25.620073573, 12.121314377), (-23.498759057, 12.99999162))
            Line((-23.498759057, 12.99999162), (-12.498776575, 12.99999162))
            ThreePointArc((-12.498776575, 12.99999162), (-10.377462058, 12.121314377), (-9.498784816, 9.999999861))
            Line((-9.498784816, 9.999999861), (-9.498784816, 7.350508853))
            ThreePointArc((-9.498784816, 7.350508853), (-9.604145594, 6.562432144), (-9.912827344, 5.829710252))
            ThreePointArc((-9.912827344, 5.829710252), (-11.499985547, 0), (-9.912827344, -5.829710252))
            ThreePointArc((-9.912827344, -5.829710252), (-9.604145594, -6.562432144), (-9.498784816, -7.350508853))
        make_face(mode=Mode.SUBTRACT)
    extrude(amount=-BOSS_EXTRUDE1_DEPTH)


solid = part.part
